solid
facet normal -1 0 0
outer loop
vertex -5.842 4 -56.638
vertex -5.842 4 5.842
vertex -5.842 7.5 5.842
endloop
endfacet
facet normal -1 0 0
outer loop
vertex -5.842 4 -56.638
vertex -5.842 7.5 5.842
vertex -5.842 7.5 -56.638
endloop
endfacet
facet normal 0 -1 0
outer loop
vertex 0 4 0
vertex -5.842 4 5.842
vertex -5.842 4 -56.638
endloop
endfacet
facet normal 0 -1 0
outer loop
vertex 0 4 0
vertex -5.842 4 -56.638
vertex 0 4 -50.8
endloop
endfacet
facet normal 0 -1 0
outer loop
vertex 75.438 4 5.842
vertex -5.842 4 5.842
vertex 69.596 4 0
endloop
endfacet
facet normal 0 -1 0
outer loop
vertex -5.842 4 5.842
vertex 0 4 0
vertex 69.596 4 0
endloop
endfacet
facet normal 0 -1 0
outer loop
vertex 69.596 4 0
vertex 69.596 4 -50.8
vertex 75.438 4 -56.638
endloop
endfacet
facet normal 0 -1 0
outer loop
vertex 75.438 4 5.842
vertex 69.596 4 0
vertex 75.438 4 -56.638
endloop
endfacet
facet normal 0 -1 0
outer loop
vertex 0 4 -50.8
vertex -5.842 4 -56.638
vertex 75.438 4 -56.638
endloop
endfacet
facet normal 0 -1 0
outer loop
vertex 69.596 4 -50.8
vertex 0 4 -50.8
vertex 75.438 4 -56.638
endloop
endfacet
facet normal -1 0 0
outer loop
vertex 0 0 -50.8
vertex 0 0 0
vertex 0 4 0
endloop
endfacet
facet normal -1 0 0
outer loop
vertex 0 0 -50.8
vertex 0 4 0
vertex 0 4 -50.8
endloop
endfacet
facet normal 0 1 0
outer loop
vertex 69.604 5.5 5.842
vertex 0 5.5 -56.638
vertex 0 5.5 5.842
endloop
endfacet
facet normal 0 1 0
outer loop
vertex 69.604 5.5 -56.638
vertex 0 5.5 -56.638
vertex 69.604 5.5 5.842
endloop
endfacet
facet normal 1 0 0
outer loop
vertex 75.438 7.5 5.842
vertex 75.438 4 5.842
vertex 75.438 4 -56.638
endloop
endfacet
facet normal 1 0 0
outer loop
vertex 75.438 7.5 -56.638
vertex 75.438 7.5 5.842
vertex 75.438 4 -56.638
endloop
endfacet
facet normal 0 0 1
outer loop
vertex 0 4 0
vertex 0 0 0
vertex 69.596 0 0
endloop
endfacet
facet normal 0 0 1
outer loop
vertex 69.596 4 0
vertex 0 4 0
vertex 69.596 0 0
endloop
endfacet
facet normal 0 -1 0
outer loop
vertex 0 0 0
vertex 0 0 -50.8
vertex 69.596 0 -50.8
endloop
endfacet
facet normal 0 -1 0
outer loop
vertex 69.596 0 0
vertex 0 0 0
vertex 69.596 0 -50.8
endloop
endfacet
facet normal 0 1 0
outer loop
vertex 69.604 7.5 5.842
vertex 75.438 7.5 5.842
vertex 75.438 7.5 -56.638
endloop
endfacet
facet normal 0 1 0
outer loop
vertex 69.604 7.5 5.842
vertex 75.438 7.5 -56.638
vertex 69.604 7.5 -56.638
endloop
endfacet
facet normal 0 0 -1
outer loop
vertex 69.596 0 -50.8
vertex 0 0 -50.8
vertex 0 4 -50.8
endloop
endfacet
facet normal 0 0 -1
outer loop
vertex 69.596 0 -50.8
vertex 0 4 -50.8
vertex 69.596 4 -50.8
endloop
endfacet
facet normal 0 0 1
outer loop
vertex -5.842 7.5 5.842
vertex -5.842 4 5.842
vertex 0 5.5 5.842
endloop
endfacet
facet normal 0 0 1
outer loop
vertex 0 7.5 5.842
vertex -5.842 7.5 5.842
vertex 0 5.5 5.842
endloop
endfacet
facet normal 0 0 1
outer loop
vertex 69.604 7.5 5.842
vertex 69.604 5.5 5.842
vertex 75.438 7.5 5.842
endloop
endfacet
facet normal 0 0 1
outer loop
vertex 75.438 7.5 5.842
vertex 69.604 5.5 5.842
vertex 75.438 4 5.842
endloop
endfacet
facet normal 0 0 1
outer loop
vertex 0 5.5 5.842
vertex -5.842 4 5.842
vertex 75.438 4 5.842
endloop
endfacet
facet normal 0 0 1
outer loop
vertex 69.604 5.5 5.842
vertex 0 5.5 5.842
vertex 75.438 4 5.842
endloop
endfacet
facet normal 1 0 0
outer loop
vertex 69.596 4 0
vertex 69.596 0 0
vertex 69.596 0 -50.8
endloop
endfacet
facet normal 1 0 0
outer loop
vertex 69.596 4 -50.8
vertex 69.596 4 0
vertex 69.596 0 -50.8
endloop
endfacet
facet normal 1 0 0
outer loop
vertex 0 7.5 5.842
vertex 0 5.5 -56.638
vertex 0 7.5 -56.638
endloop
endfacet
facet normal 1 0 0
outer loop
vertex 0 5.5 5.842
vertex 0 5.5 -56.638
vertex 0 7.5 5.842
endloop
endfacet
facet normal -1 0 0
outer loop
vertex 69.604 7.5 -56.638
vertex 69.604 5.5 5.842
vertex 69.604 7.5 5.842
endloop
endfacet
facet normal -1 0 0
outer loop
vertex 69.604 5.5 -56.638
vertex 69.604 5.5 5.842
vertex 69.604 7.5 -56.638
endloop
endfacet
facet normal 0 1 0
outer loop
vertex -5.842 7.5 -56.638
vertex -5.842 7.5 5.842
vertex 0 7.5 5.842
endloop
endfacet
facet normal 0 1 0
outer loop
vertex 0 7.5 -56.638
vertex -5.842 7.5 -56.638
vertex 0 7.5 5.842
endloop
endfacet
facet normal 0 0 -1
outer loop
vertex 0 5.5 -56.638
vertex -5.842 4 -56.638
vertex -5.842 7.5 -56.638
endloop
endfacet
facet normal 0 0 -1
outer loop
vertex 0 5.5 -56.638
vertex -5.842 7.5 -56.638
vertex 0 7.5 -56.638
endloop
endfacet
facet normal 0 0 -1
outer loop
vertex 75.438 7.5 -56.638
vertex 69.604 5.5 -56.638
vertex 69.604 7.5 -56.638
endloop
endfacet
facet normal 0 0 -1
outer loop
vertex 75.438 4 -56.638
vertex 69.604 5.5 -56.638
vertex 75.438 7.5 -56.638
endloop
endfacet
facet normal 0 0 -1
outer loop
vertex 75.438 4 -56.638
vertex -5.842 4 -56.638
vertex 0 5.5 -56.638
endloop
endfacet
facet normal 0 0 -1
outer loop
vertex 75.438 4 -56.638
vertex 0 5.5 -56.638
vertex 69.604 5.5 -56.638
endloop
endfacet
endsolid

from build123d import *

# Parameters (mm, degrees)
ESQUISSE8_W        = 69.596
ESQUISSE8_H        = 50.8
BOSS_EXTRU_2_DEPTH = 4
ESQUISSE9_W        = 81.28
ESQUISSE9_H        = 62.48
BOSS_EXTRU_3_DEPTH = 1.5
ESQUISSE10_W       = 5.842
ESQUISSE10_H       = 62.48
BOSS_EXTRU_4_DEPTH = 3.5
ESQUISSE11_W       = 5.834410006
ESQUISSE11_H       = 62.48
BOSS_EXTRU_5_DEPTH = 3.5


with BuildPart() as part:
    # Esquisse8 → Boss.-Extru.2 (new body)
    with BuildSketch(Plane(origin=(0, 0, 0), x_dir=(1, 0, 0), z_dir=(0, 1, 0))):
        with Locations((34.798, 25.4)):
            Rectangle(ESQUISSE8_W, ESQUISSE8_H)
    extrude(amount=BOSS_EXTRU_2_DEPTH)

    # Esquisse9 → Boss.-Extru.3 (add)
    with BuildSketch(Plane(origin=(0, 4, 0), x_dir=(1, 0, 0), z_dir=(0, 1, 0))):
        with Locations((34.798, 25.398)):
            Rectangle(ESQUISSE9_W, ESQUISSE9_H)
    extrude(amount=BOSS_EXTRU_3_DEPTH)

    # Esquisse10 → Boss.-Extru.4 (add)
    with BuildSketch(Plane.XZ.offset(-4)):
        with Locations((-2.921, -25.398)):
            Rectangle(ESQUISSE10_W, ESQUISSE10_H)
    extrude(amount=-BOSS_EXTRU_4_DEPTH)

    # Esquisse11 → Boss.-Extru.5 (add)
    with BuildSketch(Plane(origin=(0, 4, 0), x_dir=(-1, 0, 0), z_dir=(0, -1, 0))):
        with Locations((-72.520794997, 25.398)):
            Rectangle(ESQUISSE11_W, ESQUISSE11_H)
    extrude(amount=-BOSS_EXTRU_5_DEPTH)


solid = part.part
